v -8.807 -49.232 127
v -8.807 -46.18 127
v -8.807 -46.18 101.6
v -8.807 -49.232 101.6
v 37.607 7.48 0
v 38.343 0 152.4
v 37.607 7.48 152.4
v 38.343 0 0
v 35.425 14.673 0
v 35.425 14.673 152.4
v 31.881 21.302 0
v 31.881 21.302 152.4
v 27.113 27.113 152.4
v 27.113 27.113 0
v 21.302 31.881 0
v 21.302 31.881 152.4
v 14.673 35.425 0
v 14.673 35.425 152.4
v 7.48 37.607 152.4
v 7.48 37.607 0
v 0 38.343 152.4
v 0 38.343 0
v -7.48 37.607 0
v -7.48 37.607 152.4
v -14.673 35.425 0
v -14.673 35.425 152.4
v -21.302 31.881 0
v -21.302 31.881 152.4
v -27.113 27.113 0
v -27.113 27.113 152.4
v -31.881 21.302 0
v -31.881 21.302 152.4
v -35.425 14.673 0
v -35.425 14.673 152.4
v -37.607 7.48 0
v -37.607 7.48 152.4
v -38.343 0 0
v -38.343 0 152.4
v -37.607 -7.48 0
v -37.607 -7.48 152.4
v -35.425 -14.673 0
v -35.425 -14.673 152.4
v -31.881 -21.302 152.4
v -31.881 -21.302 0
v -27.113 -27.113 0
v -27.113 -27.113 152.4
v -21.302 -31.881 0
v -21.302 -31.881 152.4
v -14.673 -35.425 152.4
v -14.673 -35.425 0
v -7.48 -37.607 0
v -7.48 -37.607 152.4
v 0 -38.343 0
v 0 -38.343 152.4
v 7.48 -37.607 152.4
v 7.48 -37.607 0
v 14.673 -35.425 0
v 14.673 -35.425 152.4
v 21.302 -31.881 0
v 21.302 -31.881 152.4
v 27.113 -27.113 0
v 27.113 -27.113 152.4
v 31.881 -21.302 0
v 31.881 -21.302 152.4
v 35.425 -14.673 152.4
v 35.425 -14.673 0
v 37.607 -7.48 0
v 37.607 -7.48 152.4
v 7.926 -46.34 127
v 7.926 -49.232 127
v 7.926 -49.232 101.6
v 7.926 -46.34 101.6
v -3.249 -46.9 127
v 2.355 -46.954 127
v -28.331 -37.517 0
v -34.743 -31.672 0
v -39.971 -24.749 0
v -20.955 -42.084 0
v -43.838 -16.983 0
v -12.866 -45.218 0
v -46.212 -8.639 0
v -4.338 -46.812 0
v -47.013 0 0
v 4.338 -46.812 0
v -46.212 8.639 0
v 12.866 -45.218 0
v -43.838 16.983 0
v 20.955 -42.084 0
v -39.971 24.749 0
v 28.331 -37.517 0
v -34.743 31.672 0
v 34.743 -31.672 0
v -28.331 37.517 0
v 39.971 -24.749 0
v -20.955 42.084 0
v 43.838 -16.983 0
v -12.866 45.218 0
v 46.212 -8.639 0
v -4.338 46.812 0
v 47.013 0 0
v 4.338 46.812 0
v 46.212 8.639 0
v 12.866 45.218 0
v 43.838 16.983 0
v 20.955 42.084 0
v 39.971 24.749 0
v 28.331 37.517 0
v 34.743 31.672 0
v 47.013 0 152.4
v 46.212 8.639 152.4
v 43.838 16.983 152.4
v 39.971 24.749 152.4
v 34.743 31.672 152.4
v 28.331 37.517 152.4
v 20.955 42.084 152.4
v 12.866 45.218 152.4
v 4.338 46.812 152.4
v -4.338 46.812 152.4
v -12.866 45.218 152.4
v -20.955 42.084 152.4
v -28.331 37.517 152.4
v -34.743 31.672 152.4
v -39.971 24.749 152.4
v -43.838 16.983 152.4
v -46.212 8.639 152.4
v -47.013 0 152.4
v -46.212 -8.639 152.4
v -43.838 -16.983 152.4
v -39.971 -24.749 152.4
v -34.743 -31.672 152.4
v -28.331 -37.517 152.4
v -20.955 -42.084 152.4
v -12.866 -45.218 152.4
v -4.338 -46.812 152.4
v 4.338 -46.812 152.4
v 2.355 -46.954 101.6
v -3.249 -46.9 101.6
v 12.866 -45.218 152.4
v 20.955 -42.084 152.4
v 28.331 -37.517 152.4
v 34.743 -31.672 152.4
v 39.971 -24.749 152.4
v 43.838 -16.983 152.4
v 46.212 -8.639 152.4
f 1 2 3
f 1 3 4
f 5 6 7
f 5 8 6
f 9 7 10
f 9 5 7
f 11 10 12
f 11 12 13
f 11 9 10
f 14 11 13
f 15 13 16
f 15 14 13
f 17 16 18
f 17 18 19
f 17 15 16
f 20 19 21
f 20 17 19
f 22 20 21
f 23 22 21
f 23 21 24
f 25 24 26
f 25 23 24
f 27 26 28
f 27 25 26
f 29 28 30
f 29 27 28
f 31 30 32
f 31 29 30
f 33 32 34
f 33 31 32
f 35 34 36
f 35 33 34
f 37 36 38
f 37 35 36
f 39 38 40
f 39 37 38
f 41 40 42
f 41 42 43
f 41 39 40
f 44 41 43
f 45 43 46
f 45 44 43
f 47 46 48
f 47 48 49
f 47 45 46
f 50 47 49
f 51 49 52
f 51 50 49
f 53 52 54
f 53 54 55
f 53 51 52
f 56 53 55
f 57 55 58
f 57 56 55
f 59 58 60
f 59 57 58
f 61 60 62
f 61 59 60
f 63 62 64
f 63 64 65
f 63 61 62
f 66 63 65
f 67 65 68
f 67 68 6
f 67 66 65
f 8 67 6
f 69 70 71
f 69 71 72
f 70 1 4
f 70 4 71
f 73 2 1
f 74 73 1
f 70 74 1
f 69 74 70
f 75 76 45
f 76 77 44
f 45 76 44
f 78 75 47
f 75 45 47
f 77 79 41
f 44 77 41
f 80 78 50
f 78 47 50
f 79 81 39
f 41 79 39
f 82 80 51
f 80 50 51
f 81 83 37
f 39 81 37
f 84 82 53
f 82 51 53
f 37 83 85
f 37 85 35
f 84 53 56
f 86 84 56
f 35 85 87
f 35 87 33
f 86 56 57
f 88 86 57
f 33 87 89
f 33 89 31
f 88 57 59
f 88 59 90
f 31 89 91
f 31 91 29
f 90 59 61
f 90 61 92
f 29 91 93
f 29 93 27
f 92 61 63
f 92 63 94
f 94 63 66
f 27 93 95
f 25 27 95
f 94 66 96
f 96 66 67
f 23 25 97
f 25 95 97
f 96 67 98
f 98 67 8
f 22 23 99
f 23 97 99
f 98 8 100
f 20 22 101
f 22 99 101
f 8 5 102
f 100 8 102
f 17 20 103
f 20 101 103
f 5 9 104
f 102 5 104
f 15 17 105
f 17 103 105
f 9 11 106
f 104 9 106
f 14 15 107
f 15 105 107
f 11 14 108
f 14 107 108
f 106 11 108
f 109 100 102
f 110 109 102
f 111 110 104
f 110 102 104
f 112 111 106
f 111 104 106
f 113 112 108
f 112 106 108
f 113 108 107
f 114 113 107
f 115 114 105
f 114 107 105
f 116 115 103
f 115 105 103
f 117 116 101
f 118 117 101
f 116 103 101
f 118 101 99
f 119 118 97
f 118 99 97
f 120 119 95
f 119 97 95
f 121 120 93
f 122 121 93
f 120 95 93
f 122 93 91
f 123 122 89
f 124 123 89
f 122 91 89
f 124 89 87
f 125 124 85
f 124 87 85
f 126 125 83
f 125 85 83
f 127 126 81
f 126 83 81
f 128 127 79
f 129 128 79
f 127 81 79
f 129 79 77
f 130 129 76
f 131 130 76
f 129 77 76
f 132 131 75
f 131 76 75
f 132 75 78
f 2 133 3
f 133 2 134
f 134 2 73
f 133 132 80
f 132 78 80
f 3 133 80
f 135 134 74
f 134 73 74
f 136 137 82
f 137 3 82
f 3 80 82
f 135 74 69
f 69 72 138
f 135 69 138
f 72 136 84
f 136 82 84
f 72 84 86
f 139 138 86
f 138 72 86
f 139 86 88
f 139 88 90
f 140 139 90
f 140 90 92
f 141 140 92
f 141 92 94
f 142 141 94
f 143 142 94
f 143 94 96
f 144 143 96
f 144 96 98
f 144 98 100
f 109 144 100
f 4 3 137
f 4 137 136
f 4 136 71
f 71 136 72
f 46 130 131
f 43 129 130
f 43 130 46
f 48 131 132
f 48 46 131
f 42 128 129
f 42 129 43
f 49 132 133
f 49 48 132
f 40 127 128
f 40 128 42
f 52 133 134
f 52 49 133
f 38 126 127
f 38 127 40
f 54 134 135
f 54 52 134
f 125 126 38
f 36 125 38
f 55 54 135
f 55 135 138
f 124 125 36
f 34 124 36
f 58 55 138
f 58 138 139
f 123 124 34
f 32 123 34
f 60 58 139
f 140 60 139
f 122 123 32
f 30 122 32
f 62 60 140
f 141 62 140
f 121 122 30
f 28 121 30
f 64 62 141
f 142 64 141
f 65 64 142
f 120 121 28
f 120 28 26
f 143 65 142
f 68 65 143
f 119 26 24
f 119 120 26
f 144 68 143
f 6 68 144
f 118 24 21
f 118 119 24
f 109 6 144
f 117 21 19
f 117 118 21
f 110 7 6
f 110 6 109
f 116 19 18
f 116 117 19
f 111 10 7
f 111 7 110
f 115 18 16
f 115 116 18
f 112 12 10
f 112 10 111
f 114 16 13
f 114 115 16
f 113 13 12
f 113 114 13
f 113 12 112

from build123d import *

# Parameters (mm, degrees)
F0_R     = 47.0125269351
F0_R_2   = 38.3432556573
F1_DEPTH = 101.6
F4_DEPTH = 25.4
F5_DEPTH = 25.4
F6_DEPTH = 25.4


with BuildPart() as f1:
    # F0 (on Top) → F1 (new body)
    with BuildSketch(Plane.XY):
        Circle(F0_R)
        Circle(F0_R_2, mode=Mode.SUBTRACT)
    extrude(amount=F1_DEPTH)

    # F4 (add): a face of the model
    f4_faces = [f1.faces().sort_by_distance(p)[0] for p in [
        (-45.6828118712, 0, 101.6),
    ]]
    extrude(f4_faces, amount=F4_DEPTH)

    # F5 (add): a face of the model
    f5_faces = [f1.faces().sort_by_distance(p)[0] for p in [
        (-45.6828118712, 0, 127),
    ]]
    extrude(f5_faces, amount=F5_DEPTH)

    # F3 (on face) → F6 (join)
    with BuildSketch(Plane.XY.offset(101.6)):
        with BuildLine():
            ThreePointArc((7.9259239137, -46.3395880316), (-0.4478621348, -47.0103936202), (-8.8073480874, -46.180172244))
            Line((-8.8073480874, -46.180172244), (-8.8073480874, -49.2319874465))
            Line((-8.8073480874, -49.2319874465), (7.9259239137, -49.2319874465))
            Line((7.9259239137, -49.2319874465), (7.9259239137, -46.3395880316))
        make_face()
    extrude(amount=F6_DEPTH)


solid = f1.part
